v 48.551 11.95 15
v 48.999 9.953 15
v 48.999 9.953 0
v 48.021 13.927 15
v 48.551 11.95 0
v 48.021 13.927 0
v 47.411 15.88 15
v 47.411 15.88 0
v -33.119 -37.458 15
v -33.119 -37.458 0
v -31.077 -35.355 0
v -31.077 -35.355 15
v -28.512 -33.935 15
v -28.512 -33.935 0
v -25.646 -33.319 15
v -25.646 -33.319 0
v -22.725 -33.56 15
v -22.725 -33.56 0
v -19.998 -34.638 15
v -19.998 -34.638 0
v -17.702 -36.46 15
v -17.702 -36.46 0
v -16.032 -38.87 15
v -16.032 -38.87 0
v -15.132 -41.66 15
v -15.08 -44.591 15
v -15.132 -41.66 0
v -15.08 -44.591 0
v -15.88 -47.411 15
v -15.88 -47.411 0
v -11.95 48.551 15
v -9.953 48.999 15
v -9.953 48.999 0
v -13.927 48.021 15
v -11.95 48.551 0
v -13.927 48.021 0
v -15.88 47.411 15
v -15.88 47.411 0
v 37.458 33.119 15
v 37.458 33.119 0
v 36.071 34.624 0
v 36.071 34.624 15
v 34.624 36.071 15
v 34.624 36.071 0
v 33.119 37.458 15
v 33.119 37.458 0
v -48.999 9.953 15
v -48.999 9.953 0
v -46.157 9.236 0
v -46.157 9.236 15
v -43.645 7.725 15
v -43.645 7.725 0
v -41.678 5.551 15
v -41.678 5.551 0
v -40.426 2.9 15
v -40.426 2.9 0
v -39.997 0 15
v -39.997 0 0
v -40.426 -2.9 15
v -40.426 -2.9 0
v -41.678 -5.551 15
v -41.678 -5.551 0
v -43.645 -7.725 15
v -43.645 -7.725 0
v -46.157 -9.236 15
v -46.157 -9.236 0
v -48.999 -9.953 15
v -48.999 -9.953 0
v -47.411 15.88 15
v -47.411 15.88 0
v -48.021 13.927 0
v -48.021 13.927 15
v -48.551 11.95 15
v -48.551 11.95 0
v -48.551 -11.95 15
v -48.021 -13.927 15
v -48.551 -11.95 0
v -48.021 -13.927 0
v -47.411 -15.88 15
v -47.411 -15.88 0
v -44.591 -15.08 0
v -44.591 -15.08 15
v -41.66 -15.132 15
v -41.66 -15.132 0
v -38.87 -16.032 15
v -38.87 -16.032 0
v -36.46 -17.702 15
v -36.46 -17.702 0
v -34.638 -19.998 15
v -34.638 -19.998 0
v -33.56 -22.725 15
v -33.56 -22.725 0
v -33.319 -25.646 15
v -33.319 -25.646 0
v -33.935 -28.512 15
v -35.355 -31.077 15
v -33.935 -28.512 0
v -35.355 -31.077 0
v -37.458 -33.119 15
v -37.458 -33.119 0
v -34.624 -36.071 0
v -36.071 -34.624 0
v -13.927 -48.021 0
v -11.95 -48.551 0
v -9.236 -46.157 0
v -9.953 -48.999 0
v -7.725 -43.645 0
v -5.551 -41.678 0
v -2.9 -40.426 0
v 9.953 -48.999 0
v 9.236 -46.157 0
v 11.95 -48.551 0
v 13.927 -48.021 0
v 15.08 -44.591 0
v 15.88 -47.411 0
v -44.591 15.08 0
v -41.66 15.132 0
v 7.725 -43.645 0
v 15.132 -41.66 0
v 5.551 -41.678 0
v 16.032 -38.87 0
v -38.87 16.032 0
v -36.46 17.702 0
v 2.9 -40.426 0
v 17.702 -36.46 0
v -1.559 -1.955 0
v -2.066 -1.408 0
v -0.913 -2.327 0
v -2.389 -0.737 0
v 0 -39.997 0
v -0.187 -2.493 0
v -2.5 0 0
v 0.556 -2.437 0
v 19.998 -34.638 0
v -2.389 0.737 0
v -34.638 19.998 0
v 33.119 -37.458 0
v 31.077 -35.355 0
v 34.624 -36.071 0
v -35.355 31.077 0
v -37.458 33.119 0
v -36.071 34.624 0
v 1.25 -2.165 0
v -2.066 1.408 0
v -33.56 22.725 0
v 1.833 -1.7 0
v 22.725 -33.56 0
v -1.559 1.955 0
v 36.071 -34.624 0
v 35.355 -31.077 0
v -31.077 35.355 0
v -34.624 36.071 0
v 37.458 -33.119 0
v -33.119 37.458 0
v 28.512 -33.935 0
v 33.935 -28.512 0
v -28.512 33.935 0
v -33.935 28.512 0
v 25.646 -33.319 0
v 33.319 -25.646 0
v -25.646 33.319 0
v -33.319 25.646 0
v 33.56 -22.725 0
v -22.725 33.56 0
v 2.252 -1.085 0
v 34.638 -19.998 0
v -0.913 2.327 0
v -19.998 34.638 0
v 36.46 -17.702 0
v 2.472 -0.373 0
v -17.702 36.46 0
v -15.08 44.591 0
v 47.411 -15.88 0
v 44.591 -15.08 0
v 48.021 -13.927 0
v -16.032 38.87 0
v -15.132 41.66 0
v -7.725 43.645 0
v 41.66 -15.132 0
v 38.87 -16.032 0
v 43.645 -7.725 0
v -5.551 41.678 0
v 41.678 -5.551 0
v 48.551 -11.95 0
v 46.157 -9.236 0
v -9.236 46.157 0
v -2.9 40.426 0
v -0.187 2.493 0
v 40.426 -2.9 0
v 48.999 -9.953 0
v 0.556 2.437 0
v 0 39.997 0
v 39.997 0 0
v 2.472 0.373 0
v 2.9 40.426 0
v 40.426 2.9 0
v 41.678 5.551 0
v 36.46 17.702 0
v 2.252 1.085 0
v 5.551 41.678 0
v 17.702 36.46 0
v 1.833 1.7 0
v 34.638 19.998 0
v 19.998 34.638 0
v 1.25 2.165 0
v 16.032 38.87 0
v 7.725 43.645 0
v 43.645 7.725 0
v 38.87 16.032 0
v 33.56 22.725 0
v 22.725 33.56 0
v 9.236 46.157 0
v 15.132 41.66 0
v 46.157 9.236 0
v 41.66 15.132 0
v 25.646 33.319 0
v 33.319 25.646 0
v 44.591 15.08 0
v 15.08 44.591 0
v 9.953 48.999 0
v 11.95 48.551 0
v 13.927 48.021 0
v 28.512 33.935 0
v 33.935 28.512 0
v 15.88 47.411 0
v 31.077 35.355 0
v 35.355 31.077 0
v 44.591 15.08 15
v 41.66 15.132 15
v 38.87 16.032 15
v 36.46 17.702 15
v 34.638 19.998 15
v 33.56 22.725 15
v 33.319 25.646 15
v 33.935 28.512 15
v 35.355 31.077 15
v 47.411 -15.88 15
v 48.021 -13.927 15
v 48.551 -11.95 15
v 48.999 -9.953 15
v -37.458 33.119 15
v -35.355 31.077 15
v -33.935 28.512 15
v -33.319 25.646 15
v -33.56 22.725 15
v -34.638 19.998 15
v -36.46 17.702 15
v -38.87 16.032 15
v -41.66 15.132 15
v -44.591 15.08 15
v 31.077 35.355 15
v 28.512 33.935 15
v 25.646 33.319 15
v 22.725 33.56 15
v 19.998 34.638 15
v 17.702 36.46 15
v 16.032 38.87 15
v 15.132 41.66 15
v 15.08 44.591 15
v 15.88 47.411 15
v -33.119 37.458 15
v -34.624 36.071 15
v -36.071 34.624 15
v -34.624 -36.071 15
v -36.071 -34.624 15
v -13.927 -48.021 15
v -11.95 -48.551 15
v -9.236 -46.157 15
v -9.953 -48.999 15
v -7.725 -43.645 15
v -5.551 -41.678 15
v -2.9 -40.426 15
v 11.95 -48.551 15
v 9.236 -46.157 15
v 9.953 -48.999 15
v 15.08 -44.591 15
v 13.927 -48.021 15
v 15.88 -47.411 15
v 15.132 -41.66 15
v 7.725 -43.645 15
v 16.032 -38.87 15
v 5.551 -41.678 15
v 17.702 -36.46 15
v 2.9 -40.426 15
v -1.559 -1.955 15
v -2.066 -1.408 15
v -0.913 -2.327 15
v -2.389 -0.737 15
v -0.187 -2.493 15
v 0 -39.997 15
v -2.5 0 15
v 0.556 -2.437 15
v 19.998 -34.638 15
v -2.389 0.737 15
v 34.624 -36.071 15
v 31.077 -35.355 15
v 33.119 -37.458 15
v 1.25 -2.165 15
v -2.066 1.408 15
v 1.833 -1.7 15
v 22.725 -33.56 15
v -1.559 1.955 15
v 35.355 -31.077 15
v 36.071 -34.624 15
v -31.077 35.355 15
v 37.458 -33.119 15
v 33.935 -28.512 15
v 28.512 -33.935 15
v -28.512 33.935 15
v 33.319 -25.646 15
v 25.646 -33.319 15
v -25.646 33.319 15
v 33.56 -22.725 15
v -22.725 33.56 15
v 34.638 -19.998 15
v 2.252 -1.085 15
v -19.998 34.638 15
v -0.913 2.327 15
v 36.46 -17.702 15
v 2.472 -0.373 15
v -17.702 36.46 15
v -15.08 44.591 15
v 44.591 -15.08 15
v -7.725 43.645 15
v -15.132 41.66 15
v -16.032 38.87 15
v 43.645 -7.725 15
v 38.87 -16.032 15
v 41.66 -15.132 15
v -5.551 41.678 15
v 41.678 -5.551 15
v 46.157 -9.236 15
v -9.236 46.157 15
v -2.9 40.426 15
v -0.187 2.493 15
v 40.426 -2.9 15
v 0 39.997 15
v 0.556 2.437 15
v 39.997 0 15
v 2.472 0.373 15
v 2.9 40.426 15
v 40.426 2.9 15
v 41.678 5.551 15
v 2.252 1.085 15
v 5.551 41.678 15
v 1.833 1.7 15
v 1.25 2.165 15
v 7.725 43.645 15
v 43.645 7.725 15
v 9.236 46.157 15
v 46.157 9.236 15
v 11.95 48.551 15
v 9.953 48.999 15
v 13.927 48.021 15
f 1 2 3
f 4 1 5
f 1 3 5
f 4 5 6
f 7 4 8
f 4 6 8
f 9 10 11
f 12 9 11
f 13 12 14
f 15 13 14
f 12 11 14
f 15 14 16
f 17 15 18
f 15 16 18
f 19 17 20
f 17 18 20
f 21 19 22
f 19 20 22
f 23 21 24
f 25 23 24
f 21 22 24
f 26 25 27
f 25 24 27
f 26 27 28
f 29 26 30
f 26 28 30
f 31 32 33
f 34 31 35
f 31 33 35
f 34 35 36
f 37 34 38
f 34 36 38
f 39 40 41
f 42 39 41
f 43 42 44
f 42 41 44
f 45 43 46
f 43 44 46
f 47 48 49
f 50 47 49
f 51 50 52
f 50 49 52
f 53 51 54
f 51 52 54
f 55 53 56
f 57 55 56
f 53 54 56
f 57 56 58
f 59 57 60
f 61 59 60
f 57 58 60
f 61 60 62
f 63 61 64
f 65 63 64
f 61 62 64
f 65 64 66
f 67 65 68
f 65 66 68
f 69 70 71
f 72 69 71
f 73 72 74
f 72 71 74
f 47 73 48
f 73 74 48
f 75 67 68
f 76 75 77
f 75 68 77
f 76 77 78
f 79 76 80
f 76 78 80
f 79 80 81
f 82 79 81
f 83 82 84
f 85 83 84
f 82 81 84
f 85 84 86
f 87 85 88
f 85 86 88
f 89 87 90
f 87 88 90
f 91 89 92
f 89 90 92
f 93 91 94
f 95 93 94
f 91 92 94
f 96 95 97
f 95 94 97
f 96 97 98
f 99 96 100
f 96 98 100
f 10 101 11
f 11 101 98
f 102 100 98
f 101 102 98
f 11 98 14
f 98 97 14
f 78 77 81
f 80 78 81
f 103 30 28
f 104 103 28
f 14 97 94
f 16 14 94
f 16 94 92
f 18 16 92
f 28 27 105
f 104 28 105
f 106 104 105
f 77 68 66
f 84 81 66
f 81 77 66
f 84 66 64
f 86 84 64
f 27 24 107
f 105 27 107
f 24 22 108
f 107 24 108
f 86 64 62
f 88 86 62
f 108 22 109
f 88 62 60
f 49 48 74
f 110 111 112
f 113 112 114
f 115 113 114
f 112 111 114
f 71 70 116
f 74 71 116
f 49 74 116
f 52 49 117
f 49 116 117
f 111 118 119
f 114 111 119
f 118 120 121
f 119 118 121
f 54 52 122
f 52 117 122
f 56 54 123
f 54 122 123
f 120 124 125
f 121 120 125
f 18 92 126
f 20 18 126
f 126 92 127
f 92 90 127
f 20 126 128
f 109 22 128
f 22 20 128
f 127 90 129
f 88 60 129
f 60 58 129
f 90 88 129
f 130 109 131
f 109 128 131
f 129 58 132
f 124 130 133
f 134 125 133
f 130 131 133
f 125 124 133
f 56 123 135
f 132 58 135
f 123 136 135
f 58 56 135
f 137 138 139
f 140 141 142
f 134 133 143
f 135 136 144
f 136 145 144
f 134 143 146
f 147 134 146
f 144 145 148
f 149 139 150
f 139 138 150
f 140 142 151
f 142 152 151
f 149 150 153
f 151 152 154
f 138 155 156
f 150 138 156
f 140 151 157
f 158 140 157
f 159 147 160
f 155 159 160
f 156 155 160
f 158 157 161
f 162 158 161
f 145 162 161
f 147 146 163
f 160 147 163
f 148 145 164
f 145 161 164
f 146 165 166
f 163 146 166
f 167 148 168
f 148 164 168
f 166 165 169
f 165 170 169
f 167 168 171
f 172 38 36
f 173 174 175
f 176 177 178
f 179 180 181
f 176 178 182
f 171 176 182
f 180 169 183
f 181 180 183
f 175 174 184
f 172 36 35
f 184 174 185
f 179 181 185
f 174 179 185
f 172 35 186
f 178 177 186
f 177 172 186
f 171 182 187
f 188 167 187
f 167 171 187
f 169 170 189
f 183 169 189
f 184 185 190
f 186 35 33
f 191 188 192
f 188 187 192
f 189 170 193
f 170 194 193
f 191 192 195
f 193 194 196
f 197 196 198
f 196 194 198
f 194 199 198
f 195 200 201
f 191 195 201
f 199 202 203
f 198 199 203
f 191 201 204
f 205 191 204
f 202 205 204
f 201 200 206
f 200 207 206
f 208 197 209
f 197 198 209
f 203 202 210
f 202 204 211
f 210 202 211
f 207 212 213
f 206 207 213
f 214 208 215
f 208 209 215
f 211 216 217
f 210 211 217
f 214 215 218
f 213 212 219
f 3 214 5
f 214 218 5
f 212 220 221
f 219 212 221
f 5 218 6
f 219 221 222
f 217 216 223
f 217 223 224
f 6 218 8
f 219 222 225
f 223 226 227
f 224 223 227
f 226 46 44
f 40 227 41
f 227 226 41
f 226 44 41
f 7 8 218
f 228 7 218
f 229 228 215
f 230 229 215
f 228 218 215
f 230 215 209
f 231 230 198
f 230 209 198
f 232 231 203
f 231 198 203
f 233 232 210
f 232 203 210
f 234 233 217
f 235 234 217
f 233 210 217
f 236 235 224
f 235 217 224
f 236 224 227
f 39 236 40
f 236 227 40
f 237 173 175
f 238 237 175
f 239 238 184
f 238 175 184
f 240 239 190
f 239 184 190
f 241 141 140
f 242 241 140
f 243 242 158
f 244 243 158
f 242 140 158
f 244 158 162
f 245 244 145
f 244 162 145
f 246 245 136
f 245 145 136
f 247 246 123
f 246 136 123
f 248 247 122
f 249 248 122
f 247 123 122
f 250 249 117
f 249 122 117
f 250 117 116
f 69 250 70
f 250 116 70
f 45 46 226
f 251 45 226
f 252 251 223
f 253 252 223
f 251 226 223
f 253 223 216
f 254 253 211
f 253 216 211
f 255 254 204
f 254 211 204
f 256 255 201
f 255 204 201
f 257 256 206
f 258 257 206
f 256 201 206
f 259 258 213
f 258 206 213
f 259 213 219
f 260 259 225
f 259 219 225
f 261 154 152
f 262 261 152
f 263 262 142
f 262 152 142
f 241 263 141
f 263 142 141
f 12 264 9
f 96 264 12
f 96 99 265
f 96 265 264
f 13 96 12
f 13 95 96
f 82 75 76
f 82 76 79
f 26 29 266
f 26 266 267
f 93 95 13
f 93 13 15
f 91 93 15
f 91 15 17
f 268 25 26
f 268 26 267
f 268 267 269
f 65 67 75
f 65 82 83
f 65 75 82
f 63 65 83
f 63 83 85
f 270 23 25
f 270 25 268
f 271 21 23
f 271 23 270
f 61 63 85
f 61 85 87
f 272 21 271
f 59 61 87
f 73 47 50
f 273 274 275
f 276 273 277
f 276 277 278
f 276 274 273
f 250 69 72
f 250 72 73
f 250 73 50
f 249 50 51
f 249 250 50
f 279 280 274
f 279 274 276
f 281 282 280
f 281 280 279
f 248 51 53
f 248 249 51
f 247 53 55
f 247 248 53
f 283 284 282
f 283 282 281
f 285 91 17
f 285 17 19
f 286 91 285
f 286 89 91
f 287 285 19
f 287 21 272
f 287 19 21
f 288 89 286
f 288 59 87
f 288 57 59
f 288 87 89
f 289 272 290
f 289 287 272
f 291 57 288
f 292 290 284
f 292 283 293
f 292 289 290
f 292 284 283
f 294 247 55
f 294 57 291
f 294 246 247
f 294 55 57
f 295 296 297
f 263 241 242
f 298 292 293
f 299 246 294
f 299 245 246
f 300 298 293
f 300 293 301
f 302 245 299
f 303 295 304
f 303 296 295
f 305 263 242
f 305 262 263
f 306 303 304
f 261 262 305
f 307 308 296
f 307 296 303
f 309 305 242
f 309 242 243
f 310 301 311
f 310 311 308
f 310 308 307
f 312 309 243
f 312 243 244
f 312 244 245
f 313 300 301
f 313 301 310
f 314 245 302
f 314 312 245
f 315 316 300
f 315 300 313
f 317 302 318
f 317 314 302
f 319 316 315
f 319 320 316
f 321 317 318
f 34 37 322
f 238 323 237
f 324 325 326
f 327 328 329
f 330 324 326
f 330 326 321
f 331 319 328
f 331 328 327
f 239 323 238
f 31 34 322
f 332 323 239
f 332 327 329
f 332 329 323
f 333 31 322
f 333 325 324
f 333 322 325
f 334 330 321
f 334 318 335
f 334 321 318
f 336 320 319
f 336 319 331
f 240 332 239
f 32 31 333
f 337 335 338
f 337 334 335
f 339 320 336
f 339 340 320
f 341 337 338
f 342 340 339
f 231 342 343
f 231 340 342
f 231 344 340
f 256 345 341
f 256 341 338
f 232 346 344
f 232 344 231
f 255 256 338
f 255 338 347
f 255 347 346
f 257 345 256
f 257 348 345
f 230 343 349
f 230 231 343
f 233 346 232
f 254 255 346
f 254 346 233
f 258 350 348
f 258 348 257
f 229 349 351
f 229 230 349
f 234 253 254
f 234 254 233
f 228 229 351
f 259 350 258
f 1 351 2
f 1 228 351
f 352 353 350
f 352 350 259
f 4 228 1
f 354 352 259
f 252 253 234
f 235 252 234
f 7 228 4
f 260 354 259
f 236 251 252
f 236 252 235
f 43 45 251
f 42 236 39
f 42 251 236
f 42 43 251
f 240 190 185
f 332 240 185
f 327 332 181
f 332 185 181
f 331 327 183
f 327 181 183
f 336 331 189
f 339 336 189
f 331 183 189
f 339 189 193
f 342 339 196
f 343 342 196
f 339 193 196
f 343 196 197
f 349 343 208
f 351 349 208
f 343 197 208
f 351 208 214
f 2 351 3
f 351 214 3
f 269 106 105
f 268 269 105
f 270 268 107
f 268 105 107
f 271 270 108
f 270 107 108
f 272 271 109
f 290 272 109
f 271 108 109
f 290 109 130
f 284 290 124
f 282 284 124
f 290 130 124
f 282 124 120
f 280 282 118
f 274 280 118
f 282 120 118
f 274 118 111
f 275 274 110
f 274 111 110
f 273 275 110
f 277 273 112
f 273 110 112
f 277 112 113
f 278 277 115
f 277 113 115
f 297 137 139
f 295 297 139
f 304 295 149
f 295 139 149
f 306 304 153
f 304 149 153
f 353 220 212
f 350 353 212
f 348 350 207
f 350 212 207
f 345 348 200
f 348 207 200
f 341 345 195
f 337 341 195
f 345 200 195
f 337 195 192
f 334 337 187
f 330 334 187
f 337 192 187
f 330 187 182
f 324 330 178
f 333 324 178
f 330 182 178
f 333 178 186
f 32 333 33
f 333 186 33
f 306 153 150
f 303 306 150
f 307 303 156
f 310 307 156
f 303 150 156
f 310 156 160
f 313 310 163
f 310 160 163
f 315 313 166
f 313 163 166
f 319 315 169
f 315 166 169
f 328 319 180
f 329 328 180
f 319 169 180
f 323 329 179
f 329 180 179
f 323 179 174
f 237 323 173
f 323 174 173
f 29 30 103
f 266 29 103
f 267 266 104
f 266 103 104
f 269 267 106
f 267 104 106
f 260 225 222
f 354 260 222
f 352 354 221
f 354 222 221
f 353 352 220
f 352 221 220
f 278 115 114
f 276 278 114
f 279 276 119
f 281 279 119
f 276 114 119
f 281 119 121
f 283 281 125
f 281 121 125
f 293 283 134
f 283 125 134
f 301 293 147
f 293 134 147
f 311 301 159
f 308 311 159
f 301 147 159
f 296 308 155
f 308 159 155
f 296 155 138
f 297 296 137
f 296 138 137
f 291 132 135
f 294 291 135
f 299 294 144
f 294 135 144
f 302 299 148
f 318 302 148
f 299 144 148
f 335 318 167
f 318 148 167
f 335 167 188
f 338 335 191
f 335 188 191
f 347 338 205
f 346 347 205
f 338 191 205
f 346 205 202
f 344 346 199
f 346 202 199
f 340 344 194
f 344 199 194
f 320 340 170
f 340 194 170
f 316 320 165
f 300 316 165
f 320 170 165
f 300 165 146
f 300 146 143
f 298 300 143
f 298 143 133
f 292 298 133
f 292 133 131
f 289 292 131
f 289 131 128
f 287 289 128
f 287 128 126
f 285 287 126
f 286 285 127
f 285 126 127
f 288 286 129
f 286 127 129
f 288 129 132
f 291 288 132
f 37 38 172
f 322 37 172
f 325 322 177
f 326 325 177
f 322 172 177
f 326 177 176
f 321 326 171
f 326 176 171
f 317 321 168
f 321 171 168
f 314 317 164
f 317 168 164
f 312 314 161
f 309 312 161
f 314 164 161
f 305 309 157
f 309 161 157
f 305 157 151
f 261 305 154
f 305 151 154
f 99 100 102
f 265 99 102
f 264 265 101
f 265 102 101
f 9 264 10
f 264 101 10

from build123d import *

# Parameters (mm, degrees)
BOSS_EXTRUDE3_DEPTH = 15
SKETCH3_R           = 2.5
CUT_EXTRUDE2_DEPTH  = 15


with BuildPart() as part:
    # Sketch1 → Boss-Extrude3 (new body)
    with BuildSketch(Plane.XY):
        with BuildLine():
            ThreePointArc((48.999319531, 9.953224878), (48.296291314, 12.940952255), (47.411267921, 15.879914172))
            ThreePointArc((47.411267921, 15.879914172), (34.638070137, 19.998299118), (37.458043043, 33.119405359))
            ThreePointArc((37.458043043, 33.119405359), (35.355339059, 35.355339059), (33.119405359, 37.458043043))
            ThreePointArc((33.119405359, 37.458043043), (19.998299118, 34.638070137), (15.879914172, 47.411267921))
            ThreePointArc((15.879914172, 47.411267921), (12.940952255, 48.296291314), (9.953224878, 48.999319531))
            ThreePointArc((9.953224878, 48.999319531), (0, 39.996598235), (-9.953224878, 48.999319531))
            ThreePointArc((-9.953224878, 48.999319531), (-12.940952255, 48.296291314), (-15.879914172, 47.411267921))
            ThreePointArc((-15.879914172, 47.411267921), (-19.998299118, 34.638070137), (-33.119405359, 37.458043043))
            ThreePointArc((-33.119405359, 37.458043043), (-35.355339059, 35.355339059), (-37.458043043, 33.119405359))
            ThreePointArc((-37.458043043, 33.119405359), (-34.638070137, 19.998299118), (-47.411267921, 15.879914172))
            ThreePointArc((-47.411267921, 15.879914172), (-48.296291314, 12.940952255), (-48.999319531, 9.953224878))
            ThreePointArc((-48.999319531, 9.953224878), (-39.996598235, 0), (-48.999319531, -9.953224878))
            ThreePointArc((-48.999319531, -9.953224878), (-48.296291314, -12.940952255), (-47.411267921, -15.879914172))
            ThreePointArc((-47.411267921, -15.879914172), (-34.638070137, -19.998299118), (-37.458043043, -33.119405359))
            ThreePointArc((-37.458043043, -33.119405359), (-35.355339059, -35.355339059), (-33.119405359, -37.458043043))
            ThreePointArc((-33.119405359, -37.458043043), (-19.998299118, -34.638070137), (-15.879914172, -47.411267921))
            ThreePointArc((-15.879914172, -47.411267921), (-12.940952255, -48.296291314), (-9.953224878, -48.999319531))
            ThreePointArc((-9.953224878, -48.999319531), (0, -39.996598235), (9.953224878, -48.999319531))
            ThreePointArc((9.953224878, -48.999319531), (12.940952255, -48.296291314), (15.879914172, -47.411267921))
            ThreePointArc((15.879914172, -47.411267921), (19.998299118, -34.638070137), (33.119405359, -37.458043043))
            ThreePointArc((33.119405359, -37.458043043), (35.355339059, -35.355339059), (37.458043043, -33.119405359))
            ThreePointArc((37.458043043, -33.119405359), (34.638070137, -19.998299118), (47.411267921, -15.879914172))
            ThreePointArc((47.411267921, -15.879914172), (48.296291314, -12.940952255), (48.999319531, -9.953224878))
            ThreePointArc((48.999319531, -9.953224878), (39.996598235, 0), (48.999319531, 9.953224878))
        make_face()
    extrude(amount=BOSS_EXTRUDE3_DEPTH)

    # Sketch3 → Cut-Extrude2 (cut)
    with BuildSketch(Plane(origin=(0, 0, 0), x_dir=(-1, 0, 0), z_dir=(0, 0, -1))):
        Circle(SKETCH3_R)
    extrude(amount=-CUT_EXTRUDE2_DEPTH, mode=Mode.SUBTRACT)


solid = part.part
